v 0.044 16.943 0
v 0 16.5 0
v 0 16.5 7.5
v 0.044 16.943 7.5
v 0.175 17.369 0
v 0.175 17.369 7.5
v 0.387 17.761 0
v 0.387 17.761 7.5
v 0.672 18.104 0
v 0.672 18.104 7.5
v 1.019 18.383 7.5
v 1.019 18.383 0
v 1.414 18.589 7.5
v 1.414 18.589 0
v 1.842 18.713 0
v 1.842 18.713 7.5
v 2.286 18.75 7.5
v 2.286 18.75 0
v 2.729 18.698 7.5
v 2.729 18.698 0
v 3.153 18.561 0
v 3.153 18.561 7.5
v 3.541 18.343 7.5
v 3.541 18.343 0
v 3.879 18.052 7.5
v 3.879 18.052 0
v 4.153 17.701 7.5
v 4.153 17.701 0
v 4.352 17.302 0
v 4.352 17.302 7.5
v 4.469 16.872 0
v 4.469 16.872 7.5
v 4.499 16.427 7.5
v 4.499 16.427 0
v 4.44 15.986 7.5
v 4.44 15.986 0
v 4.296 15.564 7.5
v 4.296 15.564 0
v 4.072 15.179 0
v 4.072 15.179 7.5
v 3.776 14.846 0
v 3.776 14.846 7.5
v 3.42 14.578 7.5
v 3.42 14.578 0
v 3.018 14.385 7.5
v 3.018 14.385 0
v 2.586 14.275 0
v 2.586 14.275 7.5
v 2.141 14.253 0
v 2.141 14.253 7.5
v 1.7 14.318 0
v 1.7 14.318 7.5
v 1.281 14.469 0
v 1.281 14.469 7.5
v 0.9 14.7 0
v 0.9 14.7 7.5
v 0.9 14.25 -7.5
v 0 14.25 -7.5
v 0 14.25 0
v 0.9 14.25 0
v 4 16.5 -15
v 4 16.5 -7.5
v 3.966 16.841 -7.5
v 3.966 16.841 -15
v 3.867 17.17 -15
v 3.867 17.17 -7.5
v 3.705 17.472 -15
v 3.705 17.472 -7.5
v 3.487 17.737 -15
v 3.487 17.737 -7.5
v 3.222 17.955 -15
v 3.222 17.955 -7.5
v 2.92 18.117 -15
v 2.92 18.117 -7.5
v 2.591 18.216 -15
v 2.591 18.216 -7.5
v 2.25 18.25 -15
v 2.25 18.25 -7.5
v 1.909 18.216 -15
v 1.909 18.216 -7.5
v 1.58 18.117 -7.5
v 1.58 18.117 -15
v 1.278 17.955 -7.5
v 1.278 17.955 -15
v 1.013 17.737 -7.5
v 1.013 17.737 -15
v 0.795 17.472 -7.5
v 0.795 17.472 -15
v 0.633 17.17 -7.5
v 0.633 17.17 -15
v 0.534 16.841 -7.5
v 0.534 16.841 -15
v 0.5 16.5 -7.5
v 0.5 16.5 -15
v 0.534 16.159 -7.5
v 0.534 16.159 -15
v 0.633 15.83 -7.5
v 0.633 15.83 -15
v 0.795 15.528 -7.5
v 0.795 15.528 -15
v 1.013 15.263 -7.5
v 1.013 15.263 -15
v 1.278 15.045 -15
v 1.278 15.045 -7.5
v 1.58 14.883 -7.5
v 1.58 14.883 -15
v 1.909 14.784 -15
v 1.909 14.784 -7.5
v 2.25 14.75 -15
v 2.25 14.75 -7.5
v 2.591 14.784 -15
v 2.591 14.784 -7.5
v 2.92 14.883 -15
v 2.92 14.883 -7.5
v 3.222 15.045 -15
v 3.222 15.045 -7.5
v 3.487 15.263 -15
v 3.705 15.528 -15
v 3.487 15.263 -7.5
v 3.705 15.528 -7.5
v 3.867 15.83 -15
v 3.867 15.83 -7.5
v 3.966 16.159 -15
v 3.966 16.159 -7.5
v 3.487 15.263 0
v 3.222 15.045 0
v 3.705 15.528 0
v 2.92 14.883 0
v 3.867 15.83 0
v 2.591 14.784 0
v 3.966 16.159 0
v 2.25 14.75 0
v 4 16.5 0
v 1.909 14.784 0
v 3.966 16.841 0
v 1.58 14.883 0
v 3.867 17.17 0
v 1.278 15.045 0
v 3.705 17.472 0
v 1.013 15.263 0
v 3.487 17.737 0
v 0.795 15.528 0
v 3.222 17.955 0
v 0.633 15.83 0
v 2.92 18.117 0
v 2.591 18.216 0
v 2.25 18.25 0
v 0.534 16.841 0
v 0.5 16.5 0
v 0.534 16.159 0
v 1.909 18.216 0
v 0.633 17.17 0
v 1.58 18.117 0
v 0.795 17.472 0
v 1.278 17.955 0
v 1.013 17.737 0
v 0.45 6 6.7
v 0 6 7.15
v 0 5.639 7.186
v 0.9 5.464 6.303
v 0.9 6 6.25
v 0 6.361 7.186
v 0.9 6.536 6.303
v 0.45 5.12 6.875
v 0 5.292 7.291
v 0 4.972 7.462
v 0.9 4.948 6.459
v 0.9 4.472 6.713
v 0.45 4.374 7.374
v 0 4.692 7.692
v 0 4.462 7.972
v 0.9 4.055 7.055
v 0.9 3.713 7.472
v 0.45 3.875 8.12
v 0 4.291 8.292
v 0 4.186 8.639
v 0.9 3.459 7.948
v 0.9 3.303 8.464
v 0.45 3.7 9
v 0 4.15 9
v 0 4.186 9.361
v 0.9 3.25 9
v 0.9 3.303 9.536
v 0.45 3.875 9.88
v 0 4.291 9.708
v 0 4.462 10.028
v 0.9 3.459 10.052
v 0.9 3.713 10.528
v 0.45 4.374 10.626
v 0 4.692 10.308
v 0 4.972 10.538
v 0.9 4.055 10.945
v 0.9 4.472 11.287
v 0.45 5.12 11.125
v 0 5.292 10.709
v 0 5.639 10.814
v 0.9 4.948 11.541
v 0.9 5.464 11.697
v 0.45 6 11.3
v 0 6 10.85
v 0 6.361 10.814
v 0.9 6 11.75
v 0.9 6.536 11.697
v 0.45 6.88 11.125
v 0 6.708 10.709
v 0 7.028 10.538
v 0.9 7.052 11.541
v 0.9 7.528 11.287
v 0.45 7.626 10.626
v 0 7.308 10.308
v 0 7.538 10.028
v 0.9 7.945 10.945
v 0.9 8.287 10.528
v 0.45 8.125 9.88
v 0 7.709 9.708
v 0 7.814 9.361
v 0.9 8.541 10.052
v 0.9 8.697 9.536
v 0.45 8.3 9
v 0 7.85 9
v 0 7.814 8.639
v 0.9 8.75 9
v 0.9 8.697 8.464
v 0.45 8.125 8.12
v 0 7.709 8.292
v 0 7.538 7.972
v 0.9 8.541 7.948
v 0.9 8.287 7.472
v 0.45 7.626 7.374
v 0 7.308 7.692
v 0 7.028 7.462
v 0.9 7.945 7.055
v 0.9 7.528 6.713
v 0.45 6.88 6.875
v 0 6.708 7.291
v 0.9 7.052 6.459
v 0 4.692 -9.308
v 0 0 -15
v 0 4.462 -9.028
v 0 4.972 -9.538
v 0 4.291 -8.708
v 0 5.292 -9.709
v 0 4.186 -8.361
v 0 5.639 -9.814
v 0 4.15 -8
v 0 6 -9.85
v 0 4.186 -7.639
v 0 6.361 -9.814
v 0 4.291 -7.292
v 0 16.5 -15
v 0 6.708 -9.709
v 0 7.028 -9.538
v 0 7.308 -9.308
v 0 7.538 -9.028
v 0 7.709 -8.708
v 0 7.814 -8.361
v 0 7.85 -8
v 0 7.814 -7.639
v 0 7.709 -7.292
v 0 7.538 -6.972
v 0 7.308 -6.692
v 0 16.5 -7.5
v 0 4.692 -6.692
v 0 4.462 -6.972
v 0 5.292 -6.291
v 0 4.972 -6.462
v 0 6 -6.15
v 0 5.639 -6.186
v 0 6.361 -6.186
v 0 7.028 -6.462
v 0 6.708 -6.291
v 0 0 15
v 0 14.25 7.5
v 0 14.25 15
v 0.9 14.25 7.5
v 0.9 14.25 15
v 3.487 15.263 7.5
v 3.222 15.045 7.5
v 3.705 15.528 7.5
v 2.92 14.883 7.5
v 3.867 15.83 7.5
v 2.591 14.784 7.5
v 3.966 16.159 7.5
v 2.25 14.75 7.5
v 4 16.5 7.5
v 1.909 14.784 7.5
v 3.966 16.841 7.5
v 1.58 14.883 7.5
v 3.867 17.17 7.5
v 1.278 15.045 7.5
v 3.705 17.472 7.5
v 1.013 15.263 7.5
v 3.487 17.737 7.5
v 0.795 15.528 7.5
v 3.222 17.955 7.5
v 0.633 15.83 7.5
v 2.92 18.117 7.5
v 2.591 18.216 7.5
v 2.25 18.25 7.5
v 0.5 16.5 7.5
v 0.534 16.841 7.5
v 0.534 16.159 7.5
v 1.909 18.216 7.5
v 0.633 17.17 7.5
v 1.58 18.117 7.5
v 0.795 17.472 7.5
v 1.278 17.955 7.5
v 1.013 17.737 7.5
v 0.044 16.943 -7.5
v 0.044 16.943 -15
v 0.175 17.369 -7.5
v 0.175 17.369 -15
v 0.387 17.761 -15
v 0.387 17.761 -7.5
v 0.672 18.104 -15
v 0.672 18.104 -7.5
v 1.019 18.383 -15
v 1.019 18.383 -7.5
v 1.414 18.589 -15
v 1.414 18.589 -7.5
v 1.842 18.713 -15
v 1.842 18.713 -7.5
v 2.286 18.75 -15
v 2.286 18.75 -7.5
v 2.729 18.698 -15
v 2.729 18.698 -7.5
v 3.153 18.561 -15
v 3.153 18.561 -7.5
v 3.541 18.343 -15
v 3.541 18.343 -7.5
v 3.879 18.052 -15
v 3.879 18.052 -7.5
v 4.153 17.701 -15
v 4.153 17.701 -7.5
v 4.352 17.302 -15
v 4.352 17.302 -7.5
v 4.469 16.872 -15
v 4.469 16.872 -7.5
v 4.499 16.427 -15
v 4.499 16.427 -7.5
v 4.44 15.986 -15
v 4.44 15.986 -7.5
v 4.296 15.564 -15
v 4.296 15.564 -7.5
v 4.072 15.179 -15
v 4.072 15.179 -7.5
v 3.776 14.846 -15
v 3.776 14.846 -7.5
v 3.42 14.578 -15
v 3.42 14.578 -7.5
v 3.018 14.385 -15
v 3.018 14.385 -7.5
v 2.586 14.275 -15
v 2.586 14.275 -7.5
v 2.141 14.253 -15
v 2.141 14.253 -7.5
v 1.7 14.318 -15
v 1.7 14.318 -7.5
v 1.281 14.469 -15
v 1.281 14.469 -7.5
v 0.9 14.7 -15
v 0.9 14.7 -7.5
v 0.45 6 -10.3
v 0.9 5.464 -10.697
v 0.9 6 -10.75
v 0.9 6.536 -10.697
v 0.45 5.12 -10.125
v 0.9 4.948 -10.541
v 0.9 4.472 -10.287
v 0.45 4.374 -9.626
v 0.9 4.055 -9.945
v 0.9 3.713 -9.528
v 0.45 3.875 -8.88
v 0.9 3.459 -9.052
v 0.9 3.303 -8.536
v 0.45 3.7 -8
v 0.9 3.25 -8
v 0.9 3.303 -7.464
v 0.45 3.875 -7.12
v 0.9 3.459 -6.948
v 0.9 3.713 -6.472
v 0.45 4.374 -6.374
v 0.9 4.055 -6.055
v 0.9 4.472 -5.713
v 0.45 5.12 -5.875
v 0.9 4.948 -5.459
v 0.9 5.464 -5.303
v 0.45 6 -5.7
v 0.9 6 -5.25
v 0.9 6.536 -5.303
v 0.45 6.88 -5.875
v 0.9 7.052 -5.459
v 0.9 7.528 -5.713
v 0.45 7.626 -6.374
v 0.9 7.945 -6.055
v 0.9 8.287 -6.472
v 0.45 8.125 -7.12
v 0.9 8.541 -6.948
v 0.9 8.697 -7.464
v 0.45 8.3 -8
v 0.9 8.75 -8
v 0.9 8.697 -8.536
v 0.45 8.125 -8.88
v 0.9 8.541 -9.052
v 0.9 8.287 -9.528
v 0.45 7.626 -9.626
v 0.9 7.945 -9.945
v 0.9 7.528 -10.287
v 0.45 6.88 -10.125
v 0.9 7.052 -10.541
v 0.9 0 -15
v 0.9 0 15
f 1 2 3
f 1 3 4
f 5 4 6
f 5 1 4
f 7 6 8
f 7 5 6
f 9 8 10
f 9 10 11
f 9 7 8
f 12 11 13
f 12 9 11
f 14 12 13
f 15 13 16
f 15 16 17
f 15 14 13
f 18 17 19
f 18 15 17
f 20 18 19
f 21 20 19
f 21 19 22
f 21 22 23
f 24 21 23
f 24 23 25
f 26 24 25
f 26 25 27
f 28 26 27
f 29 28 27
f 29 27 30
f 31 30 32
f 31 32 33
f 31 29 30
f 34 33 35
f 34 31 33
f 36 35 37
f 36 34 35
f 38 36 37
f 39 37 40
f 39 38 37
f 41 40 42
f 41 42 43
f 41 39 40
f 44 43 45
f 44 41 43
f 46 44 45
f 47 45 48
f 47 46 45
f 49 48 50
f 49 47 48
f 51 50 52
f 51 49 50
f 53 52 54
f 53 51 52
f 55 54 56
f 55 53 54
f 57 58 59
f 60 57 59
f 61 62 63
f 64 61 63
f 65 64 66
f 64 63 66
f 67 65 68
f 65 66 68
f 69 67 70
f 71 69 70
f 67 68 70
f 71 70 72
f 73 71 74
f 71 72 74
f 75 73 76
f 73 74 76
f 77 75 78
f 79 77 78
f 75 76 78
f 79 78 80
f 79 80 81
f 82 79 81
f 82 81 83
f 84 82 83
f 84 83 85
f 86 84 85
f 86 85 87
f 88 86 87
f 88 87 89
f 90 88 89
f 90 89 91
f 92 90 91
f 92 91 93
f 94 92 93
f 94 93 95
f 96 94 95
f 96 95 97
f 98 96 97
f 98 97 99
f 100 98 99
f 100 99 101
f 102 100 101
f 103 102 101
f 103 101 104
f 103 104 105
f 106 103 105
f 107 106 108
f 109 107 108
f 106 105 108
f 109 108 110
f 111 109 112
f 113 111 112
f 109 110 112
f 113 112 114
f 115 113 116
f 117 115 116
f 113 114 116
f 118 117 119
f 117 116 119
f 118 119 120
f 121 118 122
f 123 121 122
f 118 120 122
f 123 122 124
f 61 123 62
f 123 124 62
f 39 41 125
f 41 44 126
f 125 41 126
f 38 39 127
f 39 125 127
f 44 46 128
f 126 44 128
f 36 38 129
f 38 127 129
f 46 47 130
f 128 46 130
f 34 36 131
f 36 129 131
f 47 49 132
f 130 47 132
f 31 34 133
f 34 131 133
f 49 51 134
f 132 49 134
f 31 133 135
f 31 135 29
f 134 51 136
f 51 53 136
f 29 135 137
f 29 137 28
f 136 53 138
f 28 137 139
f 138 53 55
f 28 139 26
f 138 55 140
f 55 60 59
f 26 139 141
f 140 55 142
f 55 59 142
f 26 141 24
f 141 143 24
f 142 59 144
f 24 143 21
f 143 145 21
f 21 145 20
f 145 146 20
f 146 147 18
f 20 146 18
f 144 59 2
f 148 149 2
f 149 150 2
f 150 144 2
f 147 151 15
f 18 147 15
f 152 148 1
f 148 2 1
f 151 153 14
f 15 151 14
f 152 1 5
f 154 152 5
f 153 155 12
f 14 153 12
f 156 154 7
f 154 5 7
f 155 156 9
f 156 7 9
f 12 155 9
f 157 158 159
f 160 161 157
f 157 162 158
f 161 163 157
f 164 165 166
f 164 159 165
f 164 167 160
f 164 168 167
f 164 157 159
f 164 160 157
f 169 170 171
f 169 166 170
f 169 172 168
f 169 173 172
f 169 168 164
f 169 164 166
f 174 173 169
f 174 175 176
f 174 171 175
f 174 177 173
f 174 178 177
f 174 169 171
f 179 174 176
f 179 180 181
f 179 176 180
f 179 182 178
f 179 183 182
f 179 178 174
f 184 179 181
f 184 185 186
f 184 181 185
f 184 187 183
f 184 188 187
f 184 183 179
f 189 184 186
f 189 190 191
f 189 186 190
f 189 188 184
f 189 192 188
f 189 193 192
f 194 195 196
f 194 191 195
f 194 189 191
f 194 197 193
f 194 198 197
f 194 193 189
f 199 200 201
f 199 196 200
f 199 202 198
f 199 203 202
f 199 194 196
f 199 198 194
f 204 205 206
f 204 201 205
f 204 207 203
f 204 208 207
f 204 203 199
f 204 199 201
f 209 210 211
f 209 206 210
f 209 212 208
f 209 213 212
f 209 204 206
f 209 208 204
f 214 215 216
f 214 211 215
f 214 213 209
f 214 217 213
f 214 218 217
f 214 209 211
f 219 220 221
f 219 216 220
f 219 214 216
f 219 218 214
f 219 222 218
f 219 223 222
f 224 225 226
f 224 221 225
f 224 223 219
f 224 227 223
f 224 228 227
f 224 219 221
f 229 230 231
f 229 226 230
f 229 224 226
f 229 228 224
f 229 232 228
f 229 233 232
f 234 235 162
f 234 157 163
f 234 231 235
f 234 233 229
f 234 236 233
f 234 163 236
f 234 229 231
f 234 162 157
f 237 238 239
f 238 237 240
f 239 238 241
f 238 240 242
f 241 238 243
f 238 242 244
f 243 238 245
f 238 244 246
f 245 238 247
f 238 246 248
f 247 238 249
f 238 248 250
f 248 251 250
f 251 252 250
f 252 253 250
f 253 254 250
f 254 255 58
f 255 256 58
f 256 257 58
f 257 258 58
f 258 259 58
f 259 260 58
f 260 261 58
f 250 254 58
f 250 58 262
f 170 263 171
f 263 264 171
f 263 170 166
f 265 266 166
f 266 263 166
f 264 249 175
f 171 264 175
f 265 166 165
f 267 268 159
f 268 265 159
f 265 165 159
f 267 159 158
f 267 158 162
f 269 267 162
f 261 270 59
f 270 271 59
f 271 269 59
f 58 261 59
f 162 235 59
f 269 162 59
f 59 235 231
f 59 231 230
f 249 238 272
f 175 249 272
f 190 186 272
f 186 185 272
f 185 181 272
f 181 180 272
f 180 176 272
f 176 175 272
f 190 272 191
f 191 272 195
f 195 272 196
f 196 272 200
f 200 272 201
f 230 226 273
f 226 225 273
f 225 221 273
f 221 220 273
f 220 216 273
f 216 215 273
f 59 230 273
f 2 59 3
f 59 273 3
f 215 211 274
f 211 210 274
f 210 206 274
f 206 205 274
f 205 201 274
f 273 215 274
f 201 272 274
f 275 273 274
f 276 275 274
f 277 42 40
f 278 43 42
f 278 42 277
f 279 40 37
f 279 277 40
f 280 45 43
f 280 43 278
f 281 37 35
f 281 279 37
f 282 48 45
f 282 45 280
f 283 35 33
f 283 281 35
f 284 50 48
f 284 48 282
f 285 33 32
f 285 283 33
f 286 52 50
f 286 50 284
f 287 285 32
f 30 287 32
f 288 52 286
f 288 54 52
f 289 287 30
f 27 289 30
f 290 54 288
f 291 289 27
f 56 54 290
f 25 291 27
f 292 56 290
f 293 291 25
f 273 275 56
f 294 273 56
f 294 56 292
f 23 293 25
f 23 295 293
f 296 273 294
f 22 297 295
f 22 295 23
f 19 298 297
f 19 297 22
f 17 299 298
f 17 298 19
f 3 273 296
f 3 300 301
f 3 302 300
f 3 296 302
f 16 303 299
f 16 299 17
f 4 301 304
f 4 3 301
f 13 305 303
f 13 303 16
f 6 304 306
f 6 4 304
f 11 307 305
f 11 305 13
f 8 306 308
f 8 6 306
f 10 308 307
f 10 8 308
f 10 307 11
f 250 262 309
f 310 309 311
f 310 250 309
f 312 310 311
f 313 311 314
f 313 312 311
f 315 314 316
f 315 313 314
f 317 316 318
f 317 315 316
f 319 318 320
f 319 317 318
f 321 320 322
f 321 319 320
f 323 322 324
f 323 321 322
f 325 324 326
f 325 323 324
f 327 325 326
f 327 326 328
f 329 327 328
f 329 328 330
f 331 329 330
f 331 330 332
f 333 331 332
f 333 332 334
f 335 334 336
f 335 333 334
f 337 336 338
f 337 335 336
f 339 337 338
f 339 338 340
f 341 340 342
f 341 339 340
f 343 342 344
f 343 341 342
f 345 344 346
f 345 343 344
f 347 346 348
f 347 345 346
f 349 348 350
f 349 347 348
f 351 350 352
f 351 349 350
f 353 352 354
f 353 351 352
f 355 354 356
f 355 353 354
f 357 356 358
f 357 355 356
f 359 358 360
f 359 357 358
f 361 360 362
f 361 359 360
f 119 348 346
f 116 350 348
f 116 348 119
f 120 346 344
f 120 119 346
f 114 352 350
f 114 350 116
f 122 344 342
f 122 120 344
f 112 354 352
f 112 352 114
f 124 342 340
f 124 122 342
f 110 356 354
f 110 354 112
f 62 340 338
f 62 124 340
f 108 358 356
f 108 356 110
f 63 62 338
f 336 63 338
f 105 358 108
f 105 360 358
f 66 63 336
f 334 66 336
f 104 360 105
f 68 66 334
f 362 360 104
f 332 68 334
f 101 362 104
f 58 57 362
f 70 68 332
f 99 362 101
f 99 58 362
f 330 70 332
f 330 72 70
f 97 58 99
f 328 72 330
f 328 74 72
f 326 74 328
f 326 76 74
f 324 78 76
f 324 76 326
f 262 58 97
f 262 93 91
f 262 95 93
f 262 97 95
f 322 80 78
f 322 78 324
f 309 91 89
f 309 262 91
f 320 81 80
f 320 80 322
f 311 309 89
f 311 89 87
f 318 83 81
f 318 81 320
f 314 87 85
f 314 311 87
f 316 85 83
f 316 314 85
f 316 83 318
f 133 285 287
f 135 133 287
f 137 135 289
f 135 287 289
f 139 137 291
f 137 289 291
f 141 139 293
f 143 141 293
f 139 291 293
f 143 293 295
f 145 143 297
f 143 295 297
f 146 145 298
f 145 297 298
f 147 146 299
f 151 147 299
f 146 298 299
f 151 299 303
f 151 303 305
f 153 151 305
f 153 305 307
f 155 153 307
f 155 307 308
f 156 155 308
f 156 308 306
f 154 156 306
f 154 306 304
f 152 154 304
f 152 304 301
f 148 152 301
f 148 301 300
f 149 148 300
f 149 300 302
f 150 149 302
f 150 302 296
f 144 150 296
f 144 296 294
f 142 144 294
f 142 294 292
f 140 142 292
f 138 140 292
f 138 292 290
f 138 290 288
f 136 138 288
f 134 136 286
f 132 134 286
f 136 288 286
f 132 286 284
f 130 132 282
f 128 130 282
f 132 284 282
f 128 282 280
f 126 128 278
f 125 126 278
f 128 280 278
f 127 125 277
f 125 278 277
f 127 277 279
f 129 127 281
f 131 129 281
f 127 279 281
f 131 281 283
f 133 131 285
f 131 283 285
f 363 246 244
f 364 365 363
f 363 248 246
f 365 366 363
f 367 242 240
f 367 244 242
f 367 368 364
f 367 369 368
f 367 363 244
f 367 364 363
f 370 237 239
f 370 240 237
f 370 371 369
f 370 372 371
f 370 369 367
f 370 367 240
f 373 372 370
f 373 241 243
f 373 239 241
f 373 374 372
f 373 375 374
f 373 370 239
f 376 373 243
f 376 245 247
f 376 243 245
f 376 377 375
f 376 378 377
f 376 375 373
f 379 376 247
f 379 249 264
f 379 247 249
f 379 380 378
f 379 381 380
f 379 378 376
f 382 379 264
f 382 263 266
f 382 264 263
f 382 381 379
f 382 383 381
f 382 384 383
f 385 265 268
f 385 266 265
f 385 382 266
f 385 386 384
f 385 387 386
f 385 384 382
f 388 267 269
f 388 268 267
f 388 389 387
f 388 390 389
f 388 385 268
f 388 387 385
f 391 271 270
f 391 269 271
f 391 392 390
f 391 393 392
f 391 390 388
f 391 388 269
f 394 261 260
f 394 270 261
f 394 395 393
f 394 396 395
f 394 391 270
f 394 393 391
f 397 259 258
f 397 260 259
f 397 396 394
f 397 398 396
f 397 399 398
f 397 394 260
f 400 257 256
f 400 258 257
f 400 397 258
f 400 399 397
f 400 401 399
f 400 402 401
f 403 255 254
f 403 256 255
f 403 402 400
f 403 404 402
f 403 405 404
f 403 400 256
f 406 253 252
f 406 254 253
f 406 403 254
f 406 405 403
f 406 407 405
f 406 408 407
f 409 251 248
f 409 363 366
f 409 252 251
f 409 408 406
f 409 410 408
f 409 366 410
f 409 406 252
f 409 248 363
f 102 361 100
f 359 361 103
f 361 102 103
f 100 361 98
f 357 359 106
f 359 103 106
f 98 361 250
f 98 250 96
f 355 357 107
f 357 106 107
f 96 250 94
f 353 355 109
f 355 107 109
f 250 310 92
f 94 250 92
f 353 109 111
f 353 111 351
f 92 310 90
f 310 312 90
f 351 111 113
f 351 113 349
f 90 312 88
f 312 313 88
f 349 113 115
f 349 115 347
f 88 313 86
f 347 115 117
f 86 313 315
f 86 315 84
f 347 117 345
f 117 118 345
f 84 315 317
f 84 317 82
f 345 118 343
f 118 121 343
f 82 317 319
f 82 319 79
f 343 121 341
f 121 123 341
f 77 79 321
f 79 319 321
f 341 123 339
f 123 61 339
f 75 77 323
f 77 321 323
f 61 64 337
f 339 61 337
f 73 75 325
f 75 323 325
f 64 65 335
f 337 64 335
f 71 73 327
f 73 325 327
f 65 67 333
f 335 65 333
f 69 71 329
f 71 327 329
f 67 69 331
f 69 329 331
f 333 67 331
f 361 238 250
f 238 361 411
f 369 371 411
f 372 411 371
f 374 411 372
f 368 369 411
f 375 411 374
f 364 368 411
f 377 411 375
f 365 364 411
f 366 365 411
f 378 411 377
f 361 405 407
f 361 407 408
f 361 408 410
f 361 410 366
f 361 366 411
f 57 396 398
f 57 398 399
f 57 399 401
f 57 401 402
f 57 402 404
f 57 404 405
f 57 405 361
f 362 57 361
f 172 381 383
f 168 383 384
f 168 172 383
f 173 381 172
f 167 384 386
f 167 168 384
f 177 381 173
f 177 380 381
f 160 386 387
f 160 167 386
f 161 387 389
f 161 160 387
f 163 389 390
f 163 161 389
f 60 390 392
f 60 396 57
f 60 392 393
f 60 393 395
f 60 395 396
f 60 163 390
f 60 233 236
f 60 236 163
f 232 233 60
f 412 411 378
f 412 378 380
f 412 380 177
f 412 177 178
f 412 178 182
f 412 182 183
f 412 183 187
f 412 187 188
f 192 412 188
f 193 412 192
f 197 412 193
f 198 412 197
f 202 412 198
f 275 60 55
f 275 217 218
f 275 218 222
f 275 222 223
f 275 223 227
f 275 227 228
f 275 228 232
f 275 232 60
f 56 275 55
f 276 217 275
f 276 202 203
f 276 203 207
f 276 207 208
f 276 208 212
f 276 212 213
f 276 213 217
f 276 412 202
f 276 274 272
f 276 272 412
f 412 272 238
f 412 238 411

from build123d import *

# Parameters (mm, degrees)
SCHIZZO1_W                              = 0.9
SCHIZZO1_H                              = 16.5
ESTRUSIONE_SOTTILE1_DEPTH               = 15
SCHIZZO2_R                              = 2.25
SCHIZZO4_R                              = 1.75
TAGLIO_ESTRUSIONE1_DEPTH                = 36.662480284
SCHIZZO7_W                              = 7.5
SCHIZZO7_H                              = 4.5
TAGLIO_ESTRUSIONE13_DEPTH               = 10
FORO_SVASATO_PER_VITE_M2_5_1_AT_2_COUNT = 2
FORO_SVASATO_PER_VITE_M2_5_1_AT_2_PITCH = 17


with BuildPart() as part:
    # Schizzo1 → Estrusione-Sottile1 (new, symmetric)
    with BuildSketch(Plane.XY):
        with Locations((0.45, 8.25)):
            Rectangle(SCHIZZO1_W, SCHIZZO1_H)
    extrude(amount=ESTRUSIONE_SOTTILE1_DEPTH, both=True)

    # Sweep1: sweep along a curve in space
    with BuildLine() as sweep1_path:
        Line((0.9, 16.5, 15), (0.9, 16.5, -15))
    # Schizzo2 → Sweep1 (sweep)
    with BuildSketch(Plane.XY.offset(15)):
        with Locations((2.25, 16.5)):
            Circle(SCHIZZO2_R)
    sweep(path=sweep1_path.line)

    # Schizzo4 → Taglio-Estrusione1 (cut, through all)
    with BuildSketch(Plane.XY.offset(15)):
        with Locations((2.25, 16.5)):
            Circle(SCHIZZO4_R)
    extrude(amount=-TAGLIO_ESTRUSIONE1_DEPTH, mode=Mode.SUBTRACT)

    # Schizzo7 → Taglio-Estrusione13 (cut)
    with BuildSketch(Plane.ZY):
        with Locations((11.25, 16.5)):
            Rectangle(SCHIZZO7_W, SCHIZZO7_H)
        with Locations((-3.75, 16.5)):
            Rectangle(SCHIZZO7_W, SCHIZZO7_H)
    extrude(amount=-TAGLIO_ESTRUSIONE13_DEPTH, mode=Mode.SUBTRACT)

    # Schizzo8 → Foro svasato per Vite M2.5-1 (revolve, cut)
    with BuildSketch(Plane(origin=(0.9, 6, 9), x_dir=(0, 0, -1), z_dir=(0, 1, 0))):
        Polygon((0, 0), (0, 0.9), (1.45, 0.9), (1.45, 1.3), (2.75, 0), align=None)
    foro_svasato_per_vite_m2_5_1 = revolve(axis=Axis((7.25, 6, 9), (-1, 0, 0)), mode=Mode.SUBTRACT)

    # Foro svasato per Vite M2.5-1 at 2: Foro svasato per Vite M2.5-1 ×2
    with Locations(*[(0, 0, -i * FORO_SVASATO_PER_VITE_M2_5_1_AT_2_PITCH) for i in range(1, FORO_SVASATO_PER_VITE_M2_5_1_AT_2_COUNT)]):
        add(foro_svasato_per_vite_m2_5_1, mode=Mode.SUBTRACT)


solid = part.part
